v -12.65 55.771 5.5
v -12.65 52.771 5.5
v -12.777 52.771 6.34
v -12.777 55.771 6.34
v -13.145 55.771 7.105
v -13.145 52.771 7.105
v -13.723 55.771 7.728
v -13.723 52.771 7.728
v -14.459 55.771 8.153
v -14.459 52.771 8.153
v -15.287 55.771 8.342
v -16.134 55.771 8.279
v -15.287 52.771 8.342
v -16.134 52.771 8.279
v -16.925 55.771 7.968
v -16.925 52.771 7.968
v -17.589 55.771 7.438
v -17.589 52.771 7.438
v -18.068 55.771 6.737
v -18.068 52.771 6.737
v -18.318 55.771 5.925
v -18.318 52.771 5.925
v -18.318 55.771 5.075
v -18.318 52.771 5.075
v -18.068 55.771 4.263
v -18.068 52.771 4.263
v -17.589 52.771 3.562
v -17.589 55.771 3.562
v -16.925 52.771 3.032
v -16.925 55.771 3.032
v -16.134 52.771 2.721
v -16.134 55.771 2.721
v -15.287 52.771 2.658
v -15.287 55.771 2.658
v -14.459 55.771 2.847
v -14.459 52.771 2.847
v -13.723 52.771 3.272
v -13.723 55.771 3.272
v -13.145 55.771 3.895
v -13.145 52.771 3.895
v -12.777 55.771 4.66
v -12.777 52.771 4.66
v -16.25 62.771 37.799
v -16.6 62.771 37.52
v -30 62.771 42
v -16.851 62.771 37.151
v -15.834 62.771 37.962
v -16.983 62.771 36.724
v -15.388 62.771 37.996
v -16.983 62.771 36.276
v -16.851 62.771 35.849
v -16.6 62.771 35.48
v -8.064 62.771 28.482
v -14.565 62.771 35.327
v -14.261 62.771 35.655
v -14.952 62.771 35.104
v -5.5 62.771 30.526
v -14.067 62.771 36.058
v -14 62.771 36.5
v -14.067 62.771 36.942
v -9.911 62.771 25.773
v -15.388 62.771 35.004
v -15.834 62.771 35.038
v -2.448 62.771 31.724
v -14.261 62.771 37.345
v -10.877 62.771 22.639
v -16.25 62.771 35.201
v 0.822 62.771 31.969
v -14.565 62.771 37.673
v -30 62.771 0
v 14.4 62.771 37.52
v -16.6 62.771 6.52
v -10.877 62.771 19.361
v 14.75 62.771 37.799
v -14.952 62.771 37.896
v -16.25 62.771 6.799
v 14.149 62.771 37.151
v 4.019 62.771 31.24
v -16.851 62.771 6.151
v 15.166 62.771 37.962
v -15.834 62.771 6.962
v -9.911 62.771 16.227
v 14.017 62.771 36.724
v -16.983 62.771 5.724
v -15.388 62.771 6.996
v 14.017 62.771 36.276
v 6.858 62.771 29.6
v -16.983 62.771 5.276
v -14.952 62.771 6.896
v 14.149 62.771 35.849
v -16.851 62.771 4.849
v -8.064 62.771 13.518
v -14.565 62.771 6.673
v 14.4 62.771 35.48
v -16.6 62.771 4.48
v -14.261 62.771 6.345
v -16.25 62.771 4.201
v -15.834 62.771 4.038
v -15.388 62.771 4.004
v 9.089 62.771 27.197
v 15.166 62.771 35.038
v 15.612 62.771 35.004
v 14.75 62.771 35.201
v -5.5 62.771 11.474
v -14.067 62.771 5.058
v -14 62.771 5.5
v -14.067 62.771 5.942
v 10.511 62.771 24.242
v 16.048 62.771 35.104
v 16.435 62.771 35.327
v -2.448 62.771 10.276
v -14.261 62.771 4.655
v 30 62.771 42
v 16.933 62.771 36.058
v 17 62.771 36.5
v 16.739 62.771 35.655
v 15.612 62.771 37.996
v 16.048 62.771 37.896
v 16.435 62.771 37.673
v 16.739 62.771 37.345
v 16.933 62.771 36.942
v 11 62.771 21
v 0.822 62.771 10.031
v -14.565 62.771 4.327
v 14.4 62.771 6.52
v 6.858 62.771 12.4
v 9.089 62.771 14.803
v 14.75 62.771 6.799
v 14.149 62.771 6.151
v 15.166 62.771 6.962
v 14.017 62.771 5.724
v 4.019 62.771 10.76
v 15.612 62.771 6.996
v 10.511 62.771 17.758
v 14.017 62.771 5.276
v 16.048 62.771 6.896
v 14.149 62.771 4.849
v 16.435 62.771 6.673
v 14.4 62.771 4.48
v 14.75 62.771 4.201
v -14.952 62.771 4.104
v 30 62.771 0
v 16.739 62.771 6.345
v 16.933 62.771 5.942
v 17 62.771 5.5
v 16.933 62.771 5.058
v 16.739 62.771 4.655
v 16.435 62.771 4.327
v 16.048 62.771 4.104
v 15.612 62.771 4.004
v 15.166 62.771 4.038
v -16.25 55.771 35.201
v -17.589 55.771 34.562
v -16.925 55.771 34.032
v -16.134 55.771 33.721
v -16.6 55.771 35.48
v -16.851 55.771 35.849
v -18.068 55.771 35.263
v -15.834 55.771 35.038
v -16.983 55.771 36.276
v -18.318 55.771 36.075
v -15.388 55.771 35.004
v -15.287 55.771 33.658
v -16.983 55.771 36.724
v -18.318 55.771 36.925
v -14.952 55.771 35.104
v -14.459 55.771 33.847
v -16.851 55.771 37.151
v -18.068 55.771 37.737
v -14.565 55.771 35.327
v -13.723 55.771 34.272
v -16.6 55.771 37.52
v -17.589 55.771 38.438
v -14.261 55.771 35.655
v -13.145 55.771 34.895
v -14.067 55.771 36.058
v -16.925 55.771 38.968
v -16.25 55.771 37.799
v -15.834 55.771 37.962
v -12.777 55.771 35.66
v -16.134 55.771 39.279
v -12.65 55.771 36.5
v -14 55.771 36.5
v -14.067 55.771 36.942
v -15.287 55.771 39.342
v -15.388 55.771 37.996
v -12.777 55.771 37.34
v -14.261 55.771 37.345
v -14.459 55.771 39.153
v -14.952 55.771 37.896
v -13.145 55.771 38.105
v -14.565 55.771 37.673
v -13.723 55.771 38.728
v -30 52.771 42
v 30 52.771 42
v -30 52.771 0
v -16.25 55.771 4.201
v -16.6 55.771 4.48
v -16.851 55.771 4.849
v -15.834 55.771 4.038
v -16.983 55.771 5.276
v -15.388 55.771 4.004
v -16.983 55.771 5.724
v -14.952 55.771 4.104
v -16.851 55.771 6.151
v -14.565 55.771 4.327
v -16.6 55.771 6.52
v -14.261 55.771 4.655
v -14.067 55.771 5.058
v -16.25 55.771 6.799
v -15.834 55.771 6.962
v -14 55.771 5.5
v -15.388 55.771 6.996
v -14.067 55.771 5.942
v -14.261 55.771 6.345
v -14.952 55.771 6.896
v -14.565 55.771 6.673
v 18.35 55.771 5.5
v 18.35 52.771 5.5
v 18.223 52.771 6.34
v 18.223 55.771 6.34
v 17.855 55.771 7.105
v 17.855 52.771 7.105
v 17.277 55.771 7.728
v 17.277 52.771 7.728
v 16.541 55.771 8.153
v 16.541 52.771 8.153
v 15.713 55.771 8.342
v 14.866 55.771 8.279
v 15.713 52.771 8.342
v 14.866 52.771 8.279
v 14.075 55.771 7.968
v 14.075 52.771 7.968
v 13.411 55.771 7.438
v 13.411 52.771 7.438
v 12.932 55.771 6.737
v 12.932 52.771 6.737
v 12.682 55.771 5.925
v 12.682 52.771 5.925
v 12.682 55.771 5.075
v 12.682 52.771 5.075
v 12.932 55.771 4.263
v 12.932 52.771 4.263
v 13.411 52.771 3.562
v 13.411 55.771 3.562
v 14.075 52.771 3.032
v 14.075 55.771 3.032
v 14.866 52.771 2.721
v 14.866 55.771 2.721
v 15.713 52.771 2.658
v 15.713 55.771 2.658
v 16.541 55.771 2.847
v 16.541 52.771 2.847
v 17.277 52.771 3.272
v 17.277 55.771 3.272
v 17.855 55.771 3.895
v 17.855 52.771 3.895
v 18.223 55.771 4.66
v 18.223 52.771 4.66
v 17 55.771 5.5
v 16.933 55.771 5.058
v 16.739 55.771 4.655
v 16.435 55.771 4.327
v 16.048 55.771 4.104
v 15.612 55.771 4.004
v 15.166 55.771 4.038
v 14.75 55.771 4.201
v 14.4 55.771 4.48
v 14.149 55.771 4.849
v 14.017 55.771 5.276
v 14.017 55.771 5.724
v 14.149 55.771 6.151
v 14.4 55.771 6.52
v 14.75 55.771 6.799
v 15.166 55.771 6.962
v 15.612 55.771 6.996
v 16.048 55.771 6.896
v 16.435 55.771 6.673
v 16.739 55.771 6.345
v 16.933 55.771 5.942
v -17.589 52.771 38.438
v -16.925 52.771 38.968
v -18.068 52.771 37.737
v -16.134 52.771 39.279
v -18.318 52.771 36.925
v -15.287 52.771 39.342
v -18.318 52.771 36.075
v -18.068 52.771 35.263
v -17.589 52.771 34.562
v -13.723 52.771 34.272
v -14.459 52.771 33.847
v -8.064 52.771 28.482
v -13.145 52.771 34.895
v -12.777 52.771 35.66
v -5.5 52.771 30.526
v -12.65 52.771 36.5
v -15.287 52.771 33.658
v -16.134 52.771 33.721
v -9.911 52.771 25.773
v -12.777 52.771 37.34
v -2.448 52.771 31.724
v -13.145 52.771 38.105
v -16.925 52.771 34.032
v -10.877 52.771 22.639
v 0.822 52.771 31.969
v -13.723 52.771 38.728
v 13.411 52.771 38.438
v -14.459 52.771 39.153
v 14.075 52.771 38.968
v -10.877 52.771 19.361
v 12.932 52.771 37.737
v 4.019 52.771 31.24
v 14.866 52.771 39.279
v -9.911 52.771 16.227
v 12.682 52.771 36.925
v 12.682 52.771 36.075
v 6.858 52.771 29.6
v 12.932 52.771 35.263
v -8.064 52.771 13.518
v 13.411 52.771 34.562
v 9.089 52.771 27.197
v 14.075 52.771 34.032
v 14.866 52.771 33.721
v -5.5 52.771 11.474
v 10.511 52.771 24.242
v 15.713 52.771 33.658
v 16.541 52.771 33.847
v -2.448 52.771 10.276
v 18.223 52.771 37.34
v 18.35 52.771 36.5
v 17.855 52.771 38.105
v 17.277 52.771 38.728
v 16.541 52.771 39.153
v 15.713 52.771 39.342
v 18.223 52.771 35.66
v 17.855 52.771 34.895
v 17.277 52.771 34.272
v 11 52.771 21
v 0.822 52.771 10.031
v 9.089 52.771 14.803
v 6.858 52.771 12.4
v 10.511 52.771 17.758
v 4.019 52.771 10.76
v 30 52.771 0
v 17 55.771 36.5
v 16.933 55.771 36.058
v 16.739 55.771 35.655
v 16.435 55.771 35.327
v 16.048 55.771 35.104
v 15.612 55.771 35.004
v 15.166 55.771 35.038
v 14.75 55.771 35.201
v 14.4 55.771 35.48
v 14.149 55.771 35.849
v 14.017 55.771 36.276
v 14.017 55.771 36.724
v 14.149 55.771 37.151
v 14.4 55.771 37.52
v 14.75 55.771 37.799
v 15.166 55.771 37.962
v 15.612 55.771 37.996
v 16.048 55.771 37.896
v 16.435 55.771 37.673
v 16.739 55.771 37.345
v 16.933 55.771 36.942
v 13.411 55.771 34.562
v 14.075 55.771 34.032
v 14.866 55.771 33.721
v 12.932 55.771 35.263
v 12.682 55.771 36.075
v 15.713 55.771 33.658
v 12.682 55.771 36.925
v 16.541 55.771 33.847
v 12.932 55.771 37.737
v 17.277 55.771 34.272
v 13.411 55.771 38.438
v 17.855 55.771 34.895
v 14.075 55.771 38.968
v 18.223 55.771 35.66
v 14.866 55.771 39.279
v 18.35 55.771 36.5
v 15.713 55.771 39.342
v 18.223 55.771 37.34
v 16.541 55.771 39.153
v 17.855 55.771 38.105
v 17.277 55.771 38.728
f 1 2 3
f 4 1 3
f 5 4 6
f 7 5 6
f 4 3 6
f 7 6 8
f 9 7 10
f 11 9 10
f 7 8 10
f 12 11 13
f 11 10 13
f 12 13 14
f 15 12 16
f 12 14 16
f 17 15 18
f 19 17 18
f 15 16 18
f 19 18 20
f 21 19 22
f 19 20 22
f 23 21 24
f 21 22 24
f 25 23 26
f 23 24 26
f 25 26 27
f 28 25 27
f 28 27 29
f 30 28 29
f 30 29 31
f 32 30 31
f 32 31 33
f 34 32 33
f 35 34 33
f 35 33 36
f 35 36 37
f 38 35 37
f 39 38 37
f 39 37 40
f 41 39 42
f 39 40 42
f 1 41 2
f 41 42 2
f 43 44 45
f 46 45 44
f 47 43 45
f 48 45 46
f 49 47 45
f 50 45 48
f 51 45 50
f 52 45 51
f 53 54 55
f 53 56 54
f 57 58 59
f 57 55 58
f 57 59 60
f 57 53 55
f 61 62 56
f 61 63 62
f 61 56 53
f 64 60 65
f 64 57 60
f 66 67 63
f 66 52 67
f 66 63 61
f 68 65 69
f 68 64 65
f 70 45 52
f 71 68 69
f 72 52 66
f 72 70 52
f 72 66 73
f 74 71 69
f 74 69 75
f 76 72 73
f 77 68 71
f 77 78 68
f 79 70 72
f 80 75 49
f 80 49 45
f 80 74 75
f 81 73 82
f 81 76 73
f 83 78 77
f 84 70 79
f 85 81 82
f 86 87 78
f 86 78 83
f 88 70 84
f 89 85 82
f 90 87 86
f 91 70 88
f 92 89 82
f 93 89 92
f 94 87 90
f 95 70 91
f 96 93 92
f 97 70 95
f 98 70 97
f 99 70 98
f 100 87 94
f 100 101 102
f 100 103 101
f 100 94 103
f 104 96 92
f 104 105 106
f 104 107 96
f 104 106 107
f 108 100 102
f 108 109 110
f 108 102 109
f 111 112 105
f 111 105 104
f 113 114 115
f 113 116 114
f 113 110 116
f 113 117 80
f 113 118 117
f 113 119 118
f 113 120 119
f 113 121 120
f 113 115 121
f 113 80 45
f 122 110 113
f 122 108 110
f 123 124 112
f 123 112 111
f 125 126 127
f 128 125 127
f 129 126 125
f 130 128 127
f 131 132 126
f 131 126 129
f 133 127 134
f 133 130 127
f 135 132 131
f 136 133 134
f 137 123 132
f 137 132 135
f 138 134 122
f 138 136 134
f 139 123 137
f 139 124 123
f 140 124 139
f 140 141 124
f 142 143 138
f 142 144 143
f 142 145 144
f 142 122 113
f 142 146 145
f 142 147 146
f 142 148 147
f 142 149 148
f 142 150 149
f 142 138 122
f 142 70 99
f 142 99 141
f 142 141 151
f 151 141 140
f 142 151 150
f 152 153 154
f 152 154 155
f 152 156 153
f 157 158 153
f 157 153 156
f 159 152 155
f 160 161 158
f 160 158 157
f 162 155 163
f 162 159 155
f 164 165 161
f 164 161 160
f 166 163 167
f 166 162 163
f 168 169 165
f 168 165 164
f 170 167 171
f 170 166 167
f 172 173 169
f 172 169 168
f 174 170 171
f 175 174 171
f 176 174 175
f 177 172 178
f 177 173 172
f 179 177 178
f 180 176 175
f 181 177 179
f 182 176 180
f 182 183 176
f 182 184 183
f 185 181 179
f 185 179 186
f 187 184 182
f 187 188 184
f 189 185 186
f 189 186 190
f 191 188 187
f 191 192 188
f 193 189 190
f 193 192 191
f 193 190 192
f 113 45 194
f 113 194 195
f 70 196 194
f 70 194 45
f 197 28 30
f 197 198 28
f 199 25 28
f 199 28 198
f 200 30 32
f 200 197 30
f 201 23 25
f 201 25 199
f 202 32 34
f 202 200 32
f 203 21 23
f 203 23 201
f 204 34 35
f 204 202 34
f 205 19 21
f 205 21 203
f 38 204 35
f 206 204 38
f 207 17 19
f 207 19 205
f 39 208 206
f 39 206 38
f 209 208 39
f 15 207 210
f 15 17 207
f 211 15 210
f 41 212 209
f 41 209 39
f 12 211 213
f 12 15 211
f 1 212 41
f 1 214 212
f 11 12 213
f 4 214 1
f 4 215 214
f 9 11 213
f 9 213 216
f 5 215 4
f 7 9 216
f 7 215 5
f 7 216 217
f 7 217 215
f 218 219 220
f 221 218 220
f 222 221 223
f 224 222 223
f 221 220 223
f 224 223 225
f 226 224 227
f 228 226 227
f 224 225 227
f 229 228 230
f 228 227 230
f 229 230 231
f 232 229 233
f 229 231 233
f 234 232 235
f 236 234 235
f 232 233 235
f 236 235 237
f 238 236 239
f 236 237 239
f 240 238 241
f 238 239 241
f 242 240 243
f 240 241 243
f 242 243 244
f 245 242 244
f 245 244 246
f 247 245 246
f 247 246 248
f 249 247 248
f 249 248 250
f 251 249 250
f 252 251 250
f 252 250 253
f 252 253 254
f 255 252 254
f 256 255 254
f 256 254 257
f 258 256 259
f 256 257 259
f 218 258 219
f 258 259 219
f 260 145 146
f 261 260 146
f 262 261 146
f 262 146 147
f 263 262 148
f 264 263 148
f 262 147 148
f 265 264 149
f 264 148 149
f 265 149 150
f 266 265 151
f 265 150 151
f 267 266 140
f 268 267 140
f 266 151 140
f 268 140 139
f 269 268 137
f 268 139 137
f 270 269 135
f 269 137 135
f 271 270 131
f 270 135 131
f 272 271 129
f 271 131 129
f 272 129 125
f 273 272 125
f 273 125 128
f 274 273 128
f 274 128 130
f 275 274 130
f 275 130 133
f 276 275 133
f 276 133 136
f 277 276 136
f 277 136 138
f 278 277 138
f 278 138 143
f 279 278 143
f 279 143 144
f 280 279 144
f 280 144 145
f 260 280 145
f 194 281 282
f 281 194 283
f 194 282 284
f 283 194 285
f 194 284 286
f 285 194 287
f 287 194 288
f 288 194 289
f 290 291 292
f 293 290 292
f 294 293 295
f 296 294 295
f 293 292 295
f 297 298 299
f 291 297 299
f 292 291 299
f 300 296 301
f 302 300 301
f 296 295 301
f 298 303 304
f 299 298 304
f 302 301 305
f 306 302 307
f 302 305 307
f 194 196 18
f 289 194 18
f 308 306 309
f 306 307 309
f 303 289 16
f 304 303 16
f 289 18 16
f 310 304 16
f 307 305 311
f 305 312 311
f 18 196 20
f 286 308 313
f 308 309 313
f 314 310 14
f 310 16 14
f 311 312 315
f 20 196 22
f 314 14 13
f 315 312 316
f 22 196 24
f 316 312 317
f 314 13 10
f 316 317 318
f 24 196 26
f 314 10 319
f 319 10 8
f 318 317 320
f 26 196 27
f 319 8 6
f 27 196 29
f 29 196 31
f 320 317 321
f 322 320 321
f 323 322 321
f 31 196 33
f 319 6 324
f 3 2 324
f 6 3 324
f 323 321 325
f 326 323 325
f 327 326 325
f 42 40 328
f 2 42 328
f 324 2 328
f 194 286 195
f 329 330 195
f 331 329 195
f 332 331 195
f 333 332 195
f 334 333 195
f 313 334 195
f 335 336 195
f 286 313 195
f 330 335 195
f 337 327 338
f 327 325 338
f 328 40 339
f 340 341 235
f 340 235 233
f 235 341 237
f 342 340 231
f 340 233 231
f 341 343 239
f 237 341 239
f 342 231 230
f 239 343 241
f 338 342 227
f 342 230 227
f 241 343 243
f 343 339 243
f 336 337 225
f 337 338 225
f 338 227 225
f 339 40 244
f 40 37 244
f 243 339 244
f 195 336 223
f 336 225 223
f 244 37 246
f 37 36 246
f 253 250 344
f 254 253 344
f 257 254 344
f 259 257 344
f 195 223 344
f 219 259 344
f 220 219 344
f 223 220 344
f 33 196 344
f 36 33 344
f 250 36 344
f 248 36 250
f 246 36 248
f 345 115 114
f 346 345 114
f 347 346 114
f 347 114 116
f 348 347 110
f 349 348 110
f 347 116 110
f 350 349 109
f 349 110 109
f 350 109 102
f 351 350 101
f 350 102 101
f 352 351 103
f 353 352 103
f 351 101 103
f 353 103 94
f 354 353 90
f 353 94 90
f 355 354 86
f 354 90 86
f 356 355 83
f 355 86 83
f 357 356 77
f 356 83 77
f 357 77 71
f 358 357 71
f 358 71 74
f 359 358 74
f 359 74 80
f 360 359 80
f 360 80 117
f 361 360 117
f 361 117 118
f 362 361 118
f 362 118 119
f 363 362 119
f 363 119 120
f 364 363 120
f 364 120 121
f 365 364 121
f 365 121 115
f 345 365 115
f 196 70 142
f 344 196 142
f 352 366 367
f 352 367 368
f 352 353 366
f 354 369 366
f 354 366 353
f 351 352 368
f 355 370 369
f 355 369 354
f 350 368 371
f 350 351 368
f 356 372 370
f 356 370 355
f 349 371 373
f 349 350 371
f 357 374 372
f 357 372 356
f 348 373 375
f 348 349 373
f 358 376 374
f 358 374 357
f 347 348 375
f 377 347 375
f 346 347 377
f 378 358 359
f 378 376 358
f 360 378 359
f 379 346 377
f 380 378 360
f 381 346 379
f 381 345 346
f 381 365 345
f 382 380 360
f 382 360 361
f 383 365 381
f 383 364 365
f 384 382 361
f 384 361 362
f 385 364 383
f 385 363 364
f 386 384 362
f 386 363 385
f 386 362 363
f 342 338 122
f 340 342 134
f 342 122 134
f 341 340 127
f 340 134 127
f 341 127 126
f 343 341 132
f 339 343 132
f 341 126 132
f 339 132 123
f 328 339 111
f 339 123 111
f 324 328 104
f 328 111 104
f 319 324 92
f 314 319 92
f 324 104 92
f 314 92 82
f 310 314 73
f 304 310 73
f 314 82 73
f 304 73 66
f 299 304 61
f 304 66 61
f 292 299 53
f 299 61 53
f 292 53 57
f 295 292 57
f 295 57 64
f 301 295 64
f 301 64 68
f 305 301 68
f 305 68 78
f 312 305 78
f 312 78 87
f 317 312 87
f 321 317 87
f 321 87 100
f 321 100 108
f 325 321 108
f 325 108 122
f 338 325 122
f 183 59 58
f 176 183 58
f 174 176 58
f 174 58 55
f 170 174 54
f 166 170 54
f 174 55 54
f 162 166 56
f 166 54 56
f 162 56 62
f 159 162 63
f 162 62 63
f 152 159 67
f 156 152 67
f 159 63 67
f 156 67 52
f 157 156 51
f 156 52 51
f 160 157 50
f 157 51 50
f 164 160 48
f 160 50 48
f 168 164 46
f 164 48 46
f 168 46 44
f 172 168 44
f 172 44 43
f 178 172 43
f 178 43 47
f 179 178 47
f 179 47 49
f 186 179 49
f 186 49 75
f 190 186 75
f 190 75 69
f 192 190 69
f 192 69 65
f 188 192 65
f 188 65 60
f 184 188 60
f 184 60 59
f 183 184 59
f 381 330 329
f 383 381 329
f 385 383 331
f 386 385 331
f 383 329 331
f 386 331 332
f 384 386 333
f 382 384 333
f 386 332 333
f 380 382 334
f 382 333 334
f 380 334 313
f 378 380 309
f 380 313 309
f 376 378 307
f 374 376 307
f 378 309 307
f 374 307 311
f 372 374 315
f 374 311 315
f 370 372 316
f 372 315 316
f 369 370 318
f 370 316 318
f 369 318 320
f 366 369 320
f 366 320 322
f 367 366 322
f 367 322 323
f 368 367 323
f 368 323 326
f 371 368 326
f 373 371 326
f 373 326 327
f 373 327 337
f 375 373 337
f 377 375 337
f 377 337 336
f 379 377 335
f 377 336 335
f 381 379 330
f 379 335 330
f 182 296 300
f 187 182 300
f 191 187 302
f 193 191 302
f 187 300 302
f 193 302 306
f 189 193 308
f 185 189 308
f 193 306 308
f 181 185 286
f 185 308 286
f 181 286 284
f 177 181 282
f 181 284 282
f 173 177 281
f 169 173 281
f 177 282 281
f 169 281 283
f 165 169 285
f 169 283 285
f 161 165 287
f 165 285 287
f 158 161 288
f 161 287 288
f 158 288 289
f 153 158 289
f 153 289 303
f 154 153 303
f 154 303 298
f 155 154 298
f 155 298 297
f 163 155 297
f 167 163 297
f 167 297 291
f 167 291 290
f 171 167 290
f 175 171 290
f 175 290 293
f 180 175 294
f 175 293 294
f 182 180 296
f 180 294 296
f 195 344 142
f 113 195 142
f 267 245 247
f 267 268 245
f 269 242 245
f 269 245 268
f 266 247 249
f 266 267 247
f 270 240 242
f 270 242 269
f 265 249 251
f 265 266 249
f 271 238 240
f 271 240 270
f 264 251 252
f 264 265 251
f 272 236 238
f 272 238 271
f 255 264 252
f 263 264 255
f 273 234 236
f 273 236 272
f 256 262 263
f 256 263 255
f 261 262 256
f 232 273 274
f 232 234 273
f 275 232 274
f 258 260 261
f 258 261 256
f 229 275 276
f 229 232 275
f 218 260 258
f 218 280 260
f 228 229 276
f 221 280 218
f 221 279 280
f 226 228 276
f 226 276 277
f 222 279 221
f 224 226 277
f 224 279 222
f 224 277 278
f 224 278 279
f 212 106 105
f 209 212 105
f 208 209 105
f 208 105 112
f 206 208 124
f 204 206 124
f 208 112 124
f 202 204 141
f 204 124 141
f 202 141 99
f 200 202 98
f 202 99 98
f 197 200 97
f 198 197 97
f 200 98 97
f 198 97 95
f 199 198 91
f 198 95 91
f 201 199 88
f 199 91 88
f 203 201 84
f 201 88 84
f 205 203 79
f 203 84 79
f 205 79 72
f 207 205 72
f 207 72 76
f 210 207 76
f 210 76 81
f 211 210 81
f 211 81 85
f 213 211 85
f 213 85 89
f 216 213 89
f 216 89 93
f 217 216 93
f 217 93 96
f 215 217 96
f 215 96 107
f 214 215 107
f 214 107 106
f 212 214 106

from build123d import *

# Parameters (mm, degrees)
SKETCH1_W           = 60
SKETCH1_H           = 10
BOSS_EXTRUDE1_DEPTH = 42
SKETCH2_R           = 11
SKETCH2_R_2         = 1.5
CUT_EXTRUDE1_DEPTH  = 11
SKETCH3_R           = 2.85
CUT_EXTRUDE2_DEPTH  = 3


with BuildPart() as part:
    # Sketch1 → Boss-Extrude1 (new body)
    with BuildSketch(Plane.XY):
        with Locations((0, 57.771455045)):
            Rectangle(SKETCH1_W, SKETCH1_H)
    extrude(amount=BOSS_EXTRUDE1_DEPTH)

    # Sketch2 → Cut-Extrude1 (cut, through all)
    with BuildSketch(Plane(origin=(0, 62.771455045, 0), x_dir=(1, 0, 0), z_dir=(0, 1, 0))):
        with Locations((0, -21)):
            Circle(SKETCH2_R)
        with Locations((-15.5, -36.5)):
            Circle(SKETCH2_R_2)
        with Locations((15.5, -36.5)):
            Circle(SKETCH2_R_2)
        with Locations((-15.5, -5.5)):
            Circle(SKETCH2_R_2)
        with Locations((15.5, -5.5)):
            Circle(SKETCH2_R_2)
    extrude(amount=-CUT_EXTRUDE1_DEPTH, mode=Mode.SUBTRACT)

    # Sketch3 → Cut-Extrude2 (cut)
    with BuildSketch(Plane.XZ.offset(-52.771455045)):
        with Locations((-15.5, 36.5)):
            Circle(SKETCH3_R)
        with Locations((15.5, 36.5)):
            Circle(SKETCH3_R)
        with Locations((15.5, 5.5)):
            Circle(SKETCH3_R)
        with Locations((-15.5, 5.5)):
            Circle(SKETCH3_R)
    extrude(amount=-CUT_EXTRUDE2_DEPTH, mode=Mode.SUBTRACT)


solid = part.part
